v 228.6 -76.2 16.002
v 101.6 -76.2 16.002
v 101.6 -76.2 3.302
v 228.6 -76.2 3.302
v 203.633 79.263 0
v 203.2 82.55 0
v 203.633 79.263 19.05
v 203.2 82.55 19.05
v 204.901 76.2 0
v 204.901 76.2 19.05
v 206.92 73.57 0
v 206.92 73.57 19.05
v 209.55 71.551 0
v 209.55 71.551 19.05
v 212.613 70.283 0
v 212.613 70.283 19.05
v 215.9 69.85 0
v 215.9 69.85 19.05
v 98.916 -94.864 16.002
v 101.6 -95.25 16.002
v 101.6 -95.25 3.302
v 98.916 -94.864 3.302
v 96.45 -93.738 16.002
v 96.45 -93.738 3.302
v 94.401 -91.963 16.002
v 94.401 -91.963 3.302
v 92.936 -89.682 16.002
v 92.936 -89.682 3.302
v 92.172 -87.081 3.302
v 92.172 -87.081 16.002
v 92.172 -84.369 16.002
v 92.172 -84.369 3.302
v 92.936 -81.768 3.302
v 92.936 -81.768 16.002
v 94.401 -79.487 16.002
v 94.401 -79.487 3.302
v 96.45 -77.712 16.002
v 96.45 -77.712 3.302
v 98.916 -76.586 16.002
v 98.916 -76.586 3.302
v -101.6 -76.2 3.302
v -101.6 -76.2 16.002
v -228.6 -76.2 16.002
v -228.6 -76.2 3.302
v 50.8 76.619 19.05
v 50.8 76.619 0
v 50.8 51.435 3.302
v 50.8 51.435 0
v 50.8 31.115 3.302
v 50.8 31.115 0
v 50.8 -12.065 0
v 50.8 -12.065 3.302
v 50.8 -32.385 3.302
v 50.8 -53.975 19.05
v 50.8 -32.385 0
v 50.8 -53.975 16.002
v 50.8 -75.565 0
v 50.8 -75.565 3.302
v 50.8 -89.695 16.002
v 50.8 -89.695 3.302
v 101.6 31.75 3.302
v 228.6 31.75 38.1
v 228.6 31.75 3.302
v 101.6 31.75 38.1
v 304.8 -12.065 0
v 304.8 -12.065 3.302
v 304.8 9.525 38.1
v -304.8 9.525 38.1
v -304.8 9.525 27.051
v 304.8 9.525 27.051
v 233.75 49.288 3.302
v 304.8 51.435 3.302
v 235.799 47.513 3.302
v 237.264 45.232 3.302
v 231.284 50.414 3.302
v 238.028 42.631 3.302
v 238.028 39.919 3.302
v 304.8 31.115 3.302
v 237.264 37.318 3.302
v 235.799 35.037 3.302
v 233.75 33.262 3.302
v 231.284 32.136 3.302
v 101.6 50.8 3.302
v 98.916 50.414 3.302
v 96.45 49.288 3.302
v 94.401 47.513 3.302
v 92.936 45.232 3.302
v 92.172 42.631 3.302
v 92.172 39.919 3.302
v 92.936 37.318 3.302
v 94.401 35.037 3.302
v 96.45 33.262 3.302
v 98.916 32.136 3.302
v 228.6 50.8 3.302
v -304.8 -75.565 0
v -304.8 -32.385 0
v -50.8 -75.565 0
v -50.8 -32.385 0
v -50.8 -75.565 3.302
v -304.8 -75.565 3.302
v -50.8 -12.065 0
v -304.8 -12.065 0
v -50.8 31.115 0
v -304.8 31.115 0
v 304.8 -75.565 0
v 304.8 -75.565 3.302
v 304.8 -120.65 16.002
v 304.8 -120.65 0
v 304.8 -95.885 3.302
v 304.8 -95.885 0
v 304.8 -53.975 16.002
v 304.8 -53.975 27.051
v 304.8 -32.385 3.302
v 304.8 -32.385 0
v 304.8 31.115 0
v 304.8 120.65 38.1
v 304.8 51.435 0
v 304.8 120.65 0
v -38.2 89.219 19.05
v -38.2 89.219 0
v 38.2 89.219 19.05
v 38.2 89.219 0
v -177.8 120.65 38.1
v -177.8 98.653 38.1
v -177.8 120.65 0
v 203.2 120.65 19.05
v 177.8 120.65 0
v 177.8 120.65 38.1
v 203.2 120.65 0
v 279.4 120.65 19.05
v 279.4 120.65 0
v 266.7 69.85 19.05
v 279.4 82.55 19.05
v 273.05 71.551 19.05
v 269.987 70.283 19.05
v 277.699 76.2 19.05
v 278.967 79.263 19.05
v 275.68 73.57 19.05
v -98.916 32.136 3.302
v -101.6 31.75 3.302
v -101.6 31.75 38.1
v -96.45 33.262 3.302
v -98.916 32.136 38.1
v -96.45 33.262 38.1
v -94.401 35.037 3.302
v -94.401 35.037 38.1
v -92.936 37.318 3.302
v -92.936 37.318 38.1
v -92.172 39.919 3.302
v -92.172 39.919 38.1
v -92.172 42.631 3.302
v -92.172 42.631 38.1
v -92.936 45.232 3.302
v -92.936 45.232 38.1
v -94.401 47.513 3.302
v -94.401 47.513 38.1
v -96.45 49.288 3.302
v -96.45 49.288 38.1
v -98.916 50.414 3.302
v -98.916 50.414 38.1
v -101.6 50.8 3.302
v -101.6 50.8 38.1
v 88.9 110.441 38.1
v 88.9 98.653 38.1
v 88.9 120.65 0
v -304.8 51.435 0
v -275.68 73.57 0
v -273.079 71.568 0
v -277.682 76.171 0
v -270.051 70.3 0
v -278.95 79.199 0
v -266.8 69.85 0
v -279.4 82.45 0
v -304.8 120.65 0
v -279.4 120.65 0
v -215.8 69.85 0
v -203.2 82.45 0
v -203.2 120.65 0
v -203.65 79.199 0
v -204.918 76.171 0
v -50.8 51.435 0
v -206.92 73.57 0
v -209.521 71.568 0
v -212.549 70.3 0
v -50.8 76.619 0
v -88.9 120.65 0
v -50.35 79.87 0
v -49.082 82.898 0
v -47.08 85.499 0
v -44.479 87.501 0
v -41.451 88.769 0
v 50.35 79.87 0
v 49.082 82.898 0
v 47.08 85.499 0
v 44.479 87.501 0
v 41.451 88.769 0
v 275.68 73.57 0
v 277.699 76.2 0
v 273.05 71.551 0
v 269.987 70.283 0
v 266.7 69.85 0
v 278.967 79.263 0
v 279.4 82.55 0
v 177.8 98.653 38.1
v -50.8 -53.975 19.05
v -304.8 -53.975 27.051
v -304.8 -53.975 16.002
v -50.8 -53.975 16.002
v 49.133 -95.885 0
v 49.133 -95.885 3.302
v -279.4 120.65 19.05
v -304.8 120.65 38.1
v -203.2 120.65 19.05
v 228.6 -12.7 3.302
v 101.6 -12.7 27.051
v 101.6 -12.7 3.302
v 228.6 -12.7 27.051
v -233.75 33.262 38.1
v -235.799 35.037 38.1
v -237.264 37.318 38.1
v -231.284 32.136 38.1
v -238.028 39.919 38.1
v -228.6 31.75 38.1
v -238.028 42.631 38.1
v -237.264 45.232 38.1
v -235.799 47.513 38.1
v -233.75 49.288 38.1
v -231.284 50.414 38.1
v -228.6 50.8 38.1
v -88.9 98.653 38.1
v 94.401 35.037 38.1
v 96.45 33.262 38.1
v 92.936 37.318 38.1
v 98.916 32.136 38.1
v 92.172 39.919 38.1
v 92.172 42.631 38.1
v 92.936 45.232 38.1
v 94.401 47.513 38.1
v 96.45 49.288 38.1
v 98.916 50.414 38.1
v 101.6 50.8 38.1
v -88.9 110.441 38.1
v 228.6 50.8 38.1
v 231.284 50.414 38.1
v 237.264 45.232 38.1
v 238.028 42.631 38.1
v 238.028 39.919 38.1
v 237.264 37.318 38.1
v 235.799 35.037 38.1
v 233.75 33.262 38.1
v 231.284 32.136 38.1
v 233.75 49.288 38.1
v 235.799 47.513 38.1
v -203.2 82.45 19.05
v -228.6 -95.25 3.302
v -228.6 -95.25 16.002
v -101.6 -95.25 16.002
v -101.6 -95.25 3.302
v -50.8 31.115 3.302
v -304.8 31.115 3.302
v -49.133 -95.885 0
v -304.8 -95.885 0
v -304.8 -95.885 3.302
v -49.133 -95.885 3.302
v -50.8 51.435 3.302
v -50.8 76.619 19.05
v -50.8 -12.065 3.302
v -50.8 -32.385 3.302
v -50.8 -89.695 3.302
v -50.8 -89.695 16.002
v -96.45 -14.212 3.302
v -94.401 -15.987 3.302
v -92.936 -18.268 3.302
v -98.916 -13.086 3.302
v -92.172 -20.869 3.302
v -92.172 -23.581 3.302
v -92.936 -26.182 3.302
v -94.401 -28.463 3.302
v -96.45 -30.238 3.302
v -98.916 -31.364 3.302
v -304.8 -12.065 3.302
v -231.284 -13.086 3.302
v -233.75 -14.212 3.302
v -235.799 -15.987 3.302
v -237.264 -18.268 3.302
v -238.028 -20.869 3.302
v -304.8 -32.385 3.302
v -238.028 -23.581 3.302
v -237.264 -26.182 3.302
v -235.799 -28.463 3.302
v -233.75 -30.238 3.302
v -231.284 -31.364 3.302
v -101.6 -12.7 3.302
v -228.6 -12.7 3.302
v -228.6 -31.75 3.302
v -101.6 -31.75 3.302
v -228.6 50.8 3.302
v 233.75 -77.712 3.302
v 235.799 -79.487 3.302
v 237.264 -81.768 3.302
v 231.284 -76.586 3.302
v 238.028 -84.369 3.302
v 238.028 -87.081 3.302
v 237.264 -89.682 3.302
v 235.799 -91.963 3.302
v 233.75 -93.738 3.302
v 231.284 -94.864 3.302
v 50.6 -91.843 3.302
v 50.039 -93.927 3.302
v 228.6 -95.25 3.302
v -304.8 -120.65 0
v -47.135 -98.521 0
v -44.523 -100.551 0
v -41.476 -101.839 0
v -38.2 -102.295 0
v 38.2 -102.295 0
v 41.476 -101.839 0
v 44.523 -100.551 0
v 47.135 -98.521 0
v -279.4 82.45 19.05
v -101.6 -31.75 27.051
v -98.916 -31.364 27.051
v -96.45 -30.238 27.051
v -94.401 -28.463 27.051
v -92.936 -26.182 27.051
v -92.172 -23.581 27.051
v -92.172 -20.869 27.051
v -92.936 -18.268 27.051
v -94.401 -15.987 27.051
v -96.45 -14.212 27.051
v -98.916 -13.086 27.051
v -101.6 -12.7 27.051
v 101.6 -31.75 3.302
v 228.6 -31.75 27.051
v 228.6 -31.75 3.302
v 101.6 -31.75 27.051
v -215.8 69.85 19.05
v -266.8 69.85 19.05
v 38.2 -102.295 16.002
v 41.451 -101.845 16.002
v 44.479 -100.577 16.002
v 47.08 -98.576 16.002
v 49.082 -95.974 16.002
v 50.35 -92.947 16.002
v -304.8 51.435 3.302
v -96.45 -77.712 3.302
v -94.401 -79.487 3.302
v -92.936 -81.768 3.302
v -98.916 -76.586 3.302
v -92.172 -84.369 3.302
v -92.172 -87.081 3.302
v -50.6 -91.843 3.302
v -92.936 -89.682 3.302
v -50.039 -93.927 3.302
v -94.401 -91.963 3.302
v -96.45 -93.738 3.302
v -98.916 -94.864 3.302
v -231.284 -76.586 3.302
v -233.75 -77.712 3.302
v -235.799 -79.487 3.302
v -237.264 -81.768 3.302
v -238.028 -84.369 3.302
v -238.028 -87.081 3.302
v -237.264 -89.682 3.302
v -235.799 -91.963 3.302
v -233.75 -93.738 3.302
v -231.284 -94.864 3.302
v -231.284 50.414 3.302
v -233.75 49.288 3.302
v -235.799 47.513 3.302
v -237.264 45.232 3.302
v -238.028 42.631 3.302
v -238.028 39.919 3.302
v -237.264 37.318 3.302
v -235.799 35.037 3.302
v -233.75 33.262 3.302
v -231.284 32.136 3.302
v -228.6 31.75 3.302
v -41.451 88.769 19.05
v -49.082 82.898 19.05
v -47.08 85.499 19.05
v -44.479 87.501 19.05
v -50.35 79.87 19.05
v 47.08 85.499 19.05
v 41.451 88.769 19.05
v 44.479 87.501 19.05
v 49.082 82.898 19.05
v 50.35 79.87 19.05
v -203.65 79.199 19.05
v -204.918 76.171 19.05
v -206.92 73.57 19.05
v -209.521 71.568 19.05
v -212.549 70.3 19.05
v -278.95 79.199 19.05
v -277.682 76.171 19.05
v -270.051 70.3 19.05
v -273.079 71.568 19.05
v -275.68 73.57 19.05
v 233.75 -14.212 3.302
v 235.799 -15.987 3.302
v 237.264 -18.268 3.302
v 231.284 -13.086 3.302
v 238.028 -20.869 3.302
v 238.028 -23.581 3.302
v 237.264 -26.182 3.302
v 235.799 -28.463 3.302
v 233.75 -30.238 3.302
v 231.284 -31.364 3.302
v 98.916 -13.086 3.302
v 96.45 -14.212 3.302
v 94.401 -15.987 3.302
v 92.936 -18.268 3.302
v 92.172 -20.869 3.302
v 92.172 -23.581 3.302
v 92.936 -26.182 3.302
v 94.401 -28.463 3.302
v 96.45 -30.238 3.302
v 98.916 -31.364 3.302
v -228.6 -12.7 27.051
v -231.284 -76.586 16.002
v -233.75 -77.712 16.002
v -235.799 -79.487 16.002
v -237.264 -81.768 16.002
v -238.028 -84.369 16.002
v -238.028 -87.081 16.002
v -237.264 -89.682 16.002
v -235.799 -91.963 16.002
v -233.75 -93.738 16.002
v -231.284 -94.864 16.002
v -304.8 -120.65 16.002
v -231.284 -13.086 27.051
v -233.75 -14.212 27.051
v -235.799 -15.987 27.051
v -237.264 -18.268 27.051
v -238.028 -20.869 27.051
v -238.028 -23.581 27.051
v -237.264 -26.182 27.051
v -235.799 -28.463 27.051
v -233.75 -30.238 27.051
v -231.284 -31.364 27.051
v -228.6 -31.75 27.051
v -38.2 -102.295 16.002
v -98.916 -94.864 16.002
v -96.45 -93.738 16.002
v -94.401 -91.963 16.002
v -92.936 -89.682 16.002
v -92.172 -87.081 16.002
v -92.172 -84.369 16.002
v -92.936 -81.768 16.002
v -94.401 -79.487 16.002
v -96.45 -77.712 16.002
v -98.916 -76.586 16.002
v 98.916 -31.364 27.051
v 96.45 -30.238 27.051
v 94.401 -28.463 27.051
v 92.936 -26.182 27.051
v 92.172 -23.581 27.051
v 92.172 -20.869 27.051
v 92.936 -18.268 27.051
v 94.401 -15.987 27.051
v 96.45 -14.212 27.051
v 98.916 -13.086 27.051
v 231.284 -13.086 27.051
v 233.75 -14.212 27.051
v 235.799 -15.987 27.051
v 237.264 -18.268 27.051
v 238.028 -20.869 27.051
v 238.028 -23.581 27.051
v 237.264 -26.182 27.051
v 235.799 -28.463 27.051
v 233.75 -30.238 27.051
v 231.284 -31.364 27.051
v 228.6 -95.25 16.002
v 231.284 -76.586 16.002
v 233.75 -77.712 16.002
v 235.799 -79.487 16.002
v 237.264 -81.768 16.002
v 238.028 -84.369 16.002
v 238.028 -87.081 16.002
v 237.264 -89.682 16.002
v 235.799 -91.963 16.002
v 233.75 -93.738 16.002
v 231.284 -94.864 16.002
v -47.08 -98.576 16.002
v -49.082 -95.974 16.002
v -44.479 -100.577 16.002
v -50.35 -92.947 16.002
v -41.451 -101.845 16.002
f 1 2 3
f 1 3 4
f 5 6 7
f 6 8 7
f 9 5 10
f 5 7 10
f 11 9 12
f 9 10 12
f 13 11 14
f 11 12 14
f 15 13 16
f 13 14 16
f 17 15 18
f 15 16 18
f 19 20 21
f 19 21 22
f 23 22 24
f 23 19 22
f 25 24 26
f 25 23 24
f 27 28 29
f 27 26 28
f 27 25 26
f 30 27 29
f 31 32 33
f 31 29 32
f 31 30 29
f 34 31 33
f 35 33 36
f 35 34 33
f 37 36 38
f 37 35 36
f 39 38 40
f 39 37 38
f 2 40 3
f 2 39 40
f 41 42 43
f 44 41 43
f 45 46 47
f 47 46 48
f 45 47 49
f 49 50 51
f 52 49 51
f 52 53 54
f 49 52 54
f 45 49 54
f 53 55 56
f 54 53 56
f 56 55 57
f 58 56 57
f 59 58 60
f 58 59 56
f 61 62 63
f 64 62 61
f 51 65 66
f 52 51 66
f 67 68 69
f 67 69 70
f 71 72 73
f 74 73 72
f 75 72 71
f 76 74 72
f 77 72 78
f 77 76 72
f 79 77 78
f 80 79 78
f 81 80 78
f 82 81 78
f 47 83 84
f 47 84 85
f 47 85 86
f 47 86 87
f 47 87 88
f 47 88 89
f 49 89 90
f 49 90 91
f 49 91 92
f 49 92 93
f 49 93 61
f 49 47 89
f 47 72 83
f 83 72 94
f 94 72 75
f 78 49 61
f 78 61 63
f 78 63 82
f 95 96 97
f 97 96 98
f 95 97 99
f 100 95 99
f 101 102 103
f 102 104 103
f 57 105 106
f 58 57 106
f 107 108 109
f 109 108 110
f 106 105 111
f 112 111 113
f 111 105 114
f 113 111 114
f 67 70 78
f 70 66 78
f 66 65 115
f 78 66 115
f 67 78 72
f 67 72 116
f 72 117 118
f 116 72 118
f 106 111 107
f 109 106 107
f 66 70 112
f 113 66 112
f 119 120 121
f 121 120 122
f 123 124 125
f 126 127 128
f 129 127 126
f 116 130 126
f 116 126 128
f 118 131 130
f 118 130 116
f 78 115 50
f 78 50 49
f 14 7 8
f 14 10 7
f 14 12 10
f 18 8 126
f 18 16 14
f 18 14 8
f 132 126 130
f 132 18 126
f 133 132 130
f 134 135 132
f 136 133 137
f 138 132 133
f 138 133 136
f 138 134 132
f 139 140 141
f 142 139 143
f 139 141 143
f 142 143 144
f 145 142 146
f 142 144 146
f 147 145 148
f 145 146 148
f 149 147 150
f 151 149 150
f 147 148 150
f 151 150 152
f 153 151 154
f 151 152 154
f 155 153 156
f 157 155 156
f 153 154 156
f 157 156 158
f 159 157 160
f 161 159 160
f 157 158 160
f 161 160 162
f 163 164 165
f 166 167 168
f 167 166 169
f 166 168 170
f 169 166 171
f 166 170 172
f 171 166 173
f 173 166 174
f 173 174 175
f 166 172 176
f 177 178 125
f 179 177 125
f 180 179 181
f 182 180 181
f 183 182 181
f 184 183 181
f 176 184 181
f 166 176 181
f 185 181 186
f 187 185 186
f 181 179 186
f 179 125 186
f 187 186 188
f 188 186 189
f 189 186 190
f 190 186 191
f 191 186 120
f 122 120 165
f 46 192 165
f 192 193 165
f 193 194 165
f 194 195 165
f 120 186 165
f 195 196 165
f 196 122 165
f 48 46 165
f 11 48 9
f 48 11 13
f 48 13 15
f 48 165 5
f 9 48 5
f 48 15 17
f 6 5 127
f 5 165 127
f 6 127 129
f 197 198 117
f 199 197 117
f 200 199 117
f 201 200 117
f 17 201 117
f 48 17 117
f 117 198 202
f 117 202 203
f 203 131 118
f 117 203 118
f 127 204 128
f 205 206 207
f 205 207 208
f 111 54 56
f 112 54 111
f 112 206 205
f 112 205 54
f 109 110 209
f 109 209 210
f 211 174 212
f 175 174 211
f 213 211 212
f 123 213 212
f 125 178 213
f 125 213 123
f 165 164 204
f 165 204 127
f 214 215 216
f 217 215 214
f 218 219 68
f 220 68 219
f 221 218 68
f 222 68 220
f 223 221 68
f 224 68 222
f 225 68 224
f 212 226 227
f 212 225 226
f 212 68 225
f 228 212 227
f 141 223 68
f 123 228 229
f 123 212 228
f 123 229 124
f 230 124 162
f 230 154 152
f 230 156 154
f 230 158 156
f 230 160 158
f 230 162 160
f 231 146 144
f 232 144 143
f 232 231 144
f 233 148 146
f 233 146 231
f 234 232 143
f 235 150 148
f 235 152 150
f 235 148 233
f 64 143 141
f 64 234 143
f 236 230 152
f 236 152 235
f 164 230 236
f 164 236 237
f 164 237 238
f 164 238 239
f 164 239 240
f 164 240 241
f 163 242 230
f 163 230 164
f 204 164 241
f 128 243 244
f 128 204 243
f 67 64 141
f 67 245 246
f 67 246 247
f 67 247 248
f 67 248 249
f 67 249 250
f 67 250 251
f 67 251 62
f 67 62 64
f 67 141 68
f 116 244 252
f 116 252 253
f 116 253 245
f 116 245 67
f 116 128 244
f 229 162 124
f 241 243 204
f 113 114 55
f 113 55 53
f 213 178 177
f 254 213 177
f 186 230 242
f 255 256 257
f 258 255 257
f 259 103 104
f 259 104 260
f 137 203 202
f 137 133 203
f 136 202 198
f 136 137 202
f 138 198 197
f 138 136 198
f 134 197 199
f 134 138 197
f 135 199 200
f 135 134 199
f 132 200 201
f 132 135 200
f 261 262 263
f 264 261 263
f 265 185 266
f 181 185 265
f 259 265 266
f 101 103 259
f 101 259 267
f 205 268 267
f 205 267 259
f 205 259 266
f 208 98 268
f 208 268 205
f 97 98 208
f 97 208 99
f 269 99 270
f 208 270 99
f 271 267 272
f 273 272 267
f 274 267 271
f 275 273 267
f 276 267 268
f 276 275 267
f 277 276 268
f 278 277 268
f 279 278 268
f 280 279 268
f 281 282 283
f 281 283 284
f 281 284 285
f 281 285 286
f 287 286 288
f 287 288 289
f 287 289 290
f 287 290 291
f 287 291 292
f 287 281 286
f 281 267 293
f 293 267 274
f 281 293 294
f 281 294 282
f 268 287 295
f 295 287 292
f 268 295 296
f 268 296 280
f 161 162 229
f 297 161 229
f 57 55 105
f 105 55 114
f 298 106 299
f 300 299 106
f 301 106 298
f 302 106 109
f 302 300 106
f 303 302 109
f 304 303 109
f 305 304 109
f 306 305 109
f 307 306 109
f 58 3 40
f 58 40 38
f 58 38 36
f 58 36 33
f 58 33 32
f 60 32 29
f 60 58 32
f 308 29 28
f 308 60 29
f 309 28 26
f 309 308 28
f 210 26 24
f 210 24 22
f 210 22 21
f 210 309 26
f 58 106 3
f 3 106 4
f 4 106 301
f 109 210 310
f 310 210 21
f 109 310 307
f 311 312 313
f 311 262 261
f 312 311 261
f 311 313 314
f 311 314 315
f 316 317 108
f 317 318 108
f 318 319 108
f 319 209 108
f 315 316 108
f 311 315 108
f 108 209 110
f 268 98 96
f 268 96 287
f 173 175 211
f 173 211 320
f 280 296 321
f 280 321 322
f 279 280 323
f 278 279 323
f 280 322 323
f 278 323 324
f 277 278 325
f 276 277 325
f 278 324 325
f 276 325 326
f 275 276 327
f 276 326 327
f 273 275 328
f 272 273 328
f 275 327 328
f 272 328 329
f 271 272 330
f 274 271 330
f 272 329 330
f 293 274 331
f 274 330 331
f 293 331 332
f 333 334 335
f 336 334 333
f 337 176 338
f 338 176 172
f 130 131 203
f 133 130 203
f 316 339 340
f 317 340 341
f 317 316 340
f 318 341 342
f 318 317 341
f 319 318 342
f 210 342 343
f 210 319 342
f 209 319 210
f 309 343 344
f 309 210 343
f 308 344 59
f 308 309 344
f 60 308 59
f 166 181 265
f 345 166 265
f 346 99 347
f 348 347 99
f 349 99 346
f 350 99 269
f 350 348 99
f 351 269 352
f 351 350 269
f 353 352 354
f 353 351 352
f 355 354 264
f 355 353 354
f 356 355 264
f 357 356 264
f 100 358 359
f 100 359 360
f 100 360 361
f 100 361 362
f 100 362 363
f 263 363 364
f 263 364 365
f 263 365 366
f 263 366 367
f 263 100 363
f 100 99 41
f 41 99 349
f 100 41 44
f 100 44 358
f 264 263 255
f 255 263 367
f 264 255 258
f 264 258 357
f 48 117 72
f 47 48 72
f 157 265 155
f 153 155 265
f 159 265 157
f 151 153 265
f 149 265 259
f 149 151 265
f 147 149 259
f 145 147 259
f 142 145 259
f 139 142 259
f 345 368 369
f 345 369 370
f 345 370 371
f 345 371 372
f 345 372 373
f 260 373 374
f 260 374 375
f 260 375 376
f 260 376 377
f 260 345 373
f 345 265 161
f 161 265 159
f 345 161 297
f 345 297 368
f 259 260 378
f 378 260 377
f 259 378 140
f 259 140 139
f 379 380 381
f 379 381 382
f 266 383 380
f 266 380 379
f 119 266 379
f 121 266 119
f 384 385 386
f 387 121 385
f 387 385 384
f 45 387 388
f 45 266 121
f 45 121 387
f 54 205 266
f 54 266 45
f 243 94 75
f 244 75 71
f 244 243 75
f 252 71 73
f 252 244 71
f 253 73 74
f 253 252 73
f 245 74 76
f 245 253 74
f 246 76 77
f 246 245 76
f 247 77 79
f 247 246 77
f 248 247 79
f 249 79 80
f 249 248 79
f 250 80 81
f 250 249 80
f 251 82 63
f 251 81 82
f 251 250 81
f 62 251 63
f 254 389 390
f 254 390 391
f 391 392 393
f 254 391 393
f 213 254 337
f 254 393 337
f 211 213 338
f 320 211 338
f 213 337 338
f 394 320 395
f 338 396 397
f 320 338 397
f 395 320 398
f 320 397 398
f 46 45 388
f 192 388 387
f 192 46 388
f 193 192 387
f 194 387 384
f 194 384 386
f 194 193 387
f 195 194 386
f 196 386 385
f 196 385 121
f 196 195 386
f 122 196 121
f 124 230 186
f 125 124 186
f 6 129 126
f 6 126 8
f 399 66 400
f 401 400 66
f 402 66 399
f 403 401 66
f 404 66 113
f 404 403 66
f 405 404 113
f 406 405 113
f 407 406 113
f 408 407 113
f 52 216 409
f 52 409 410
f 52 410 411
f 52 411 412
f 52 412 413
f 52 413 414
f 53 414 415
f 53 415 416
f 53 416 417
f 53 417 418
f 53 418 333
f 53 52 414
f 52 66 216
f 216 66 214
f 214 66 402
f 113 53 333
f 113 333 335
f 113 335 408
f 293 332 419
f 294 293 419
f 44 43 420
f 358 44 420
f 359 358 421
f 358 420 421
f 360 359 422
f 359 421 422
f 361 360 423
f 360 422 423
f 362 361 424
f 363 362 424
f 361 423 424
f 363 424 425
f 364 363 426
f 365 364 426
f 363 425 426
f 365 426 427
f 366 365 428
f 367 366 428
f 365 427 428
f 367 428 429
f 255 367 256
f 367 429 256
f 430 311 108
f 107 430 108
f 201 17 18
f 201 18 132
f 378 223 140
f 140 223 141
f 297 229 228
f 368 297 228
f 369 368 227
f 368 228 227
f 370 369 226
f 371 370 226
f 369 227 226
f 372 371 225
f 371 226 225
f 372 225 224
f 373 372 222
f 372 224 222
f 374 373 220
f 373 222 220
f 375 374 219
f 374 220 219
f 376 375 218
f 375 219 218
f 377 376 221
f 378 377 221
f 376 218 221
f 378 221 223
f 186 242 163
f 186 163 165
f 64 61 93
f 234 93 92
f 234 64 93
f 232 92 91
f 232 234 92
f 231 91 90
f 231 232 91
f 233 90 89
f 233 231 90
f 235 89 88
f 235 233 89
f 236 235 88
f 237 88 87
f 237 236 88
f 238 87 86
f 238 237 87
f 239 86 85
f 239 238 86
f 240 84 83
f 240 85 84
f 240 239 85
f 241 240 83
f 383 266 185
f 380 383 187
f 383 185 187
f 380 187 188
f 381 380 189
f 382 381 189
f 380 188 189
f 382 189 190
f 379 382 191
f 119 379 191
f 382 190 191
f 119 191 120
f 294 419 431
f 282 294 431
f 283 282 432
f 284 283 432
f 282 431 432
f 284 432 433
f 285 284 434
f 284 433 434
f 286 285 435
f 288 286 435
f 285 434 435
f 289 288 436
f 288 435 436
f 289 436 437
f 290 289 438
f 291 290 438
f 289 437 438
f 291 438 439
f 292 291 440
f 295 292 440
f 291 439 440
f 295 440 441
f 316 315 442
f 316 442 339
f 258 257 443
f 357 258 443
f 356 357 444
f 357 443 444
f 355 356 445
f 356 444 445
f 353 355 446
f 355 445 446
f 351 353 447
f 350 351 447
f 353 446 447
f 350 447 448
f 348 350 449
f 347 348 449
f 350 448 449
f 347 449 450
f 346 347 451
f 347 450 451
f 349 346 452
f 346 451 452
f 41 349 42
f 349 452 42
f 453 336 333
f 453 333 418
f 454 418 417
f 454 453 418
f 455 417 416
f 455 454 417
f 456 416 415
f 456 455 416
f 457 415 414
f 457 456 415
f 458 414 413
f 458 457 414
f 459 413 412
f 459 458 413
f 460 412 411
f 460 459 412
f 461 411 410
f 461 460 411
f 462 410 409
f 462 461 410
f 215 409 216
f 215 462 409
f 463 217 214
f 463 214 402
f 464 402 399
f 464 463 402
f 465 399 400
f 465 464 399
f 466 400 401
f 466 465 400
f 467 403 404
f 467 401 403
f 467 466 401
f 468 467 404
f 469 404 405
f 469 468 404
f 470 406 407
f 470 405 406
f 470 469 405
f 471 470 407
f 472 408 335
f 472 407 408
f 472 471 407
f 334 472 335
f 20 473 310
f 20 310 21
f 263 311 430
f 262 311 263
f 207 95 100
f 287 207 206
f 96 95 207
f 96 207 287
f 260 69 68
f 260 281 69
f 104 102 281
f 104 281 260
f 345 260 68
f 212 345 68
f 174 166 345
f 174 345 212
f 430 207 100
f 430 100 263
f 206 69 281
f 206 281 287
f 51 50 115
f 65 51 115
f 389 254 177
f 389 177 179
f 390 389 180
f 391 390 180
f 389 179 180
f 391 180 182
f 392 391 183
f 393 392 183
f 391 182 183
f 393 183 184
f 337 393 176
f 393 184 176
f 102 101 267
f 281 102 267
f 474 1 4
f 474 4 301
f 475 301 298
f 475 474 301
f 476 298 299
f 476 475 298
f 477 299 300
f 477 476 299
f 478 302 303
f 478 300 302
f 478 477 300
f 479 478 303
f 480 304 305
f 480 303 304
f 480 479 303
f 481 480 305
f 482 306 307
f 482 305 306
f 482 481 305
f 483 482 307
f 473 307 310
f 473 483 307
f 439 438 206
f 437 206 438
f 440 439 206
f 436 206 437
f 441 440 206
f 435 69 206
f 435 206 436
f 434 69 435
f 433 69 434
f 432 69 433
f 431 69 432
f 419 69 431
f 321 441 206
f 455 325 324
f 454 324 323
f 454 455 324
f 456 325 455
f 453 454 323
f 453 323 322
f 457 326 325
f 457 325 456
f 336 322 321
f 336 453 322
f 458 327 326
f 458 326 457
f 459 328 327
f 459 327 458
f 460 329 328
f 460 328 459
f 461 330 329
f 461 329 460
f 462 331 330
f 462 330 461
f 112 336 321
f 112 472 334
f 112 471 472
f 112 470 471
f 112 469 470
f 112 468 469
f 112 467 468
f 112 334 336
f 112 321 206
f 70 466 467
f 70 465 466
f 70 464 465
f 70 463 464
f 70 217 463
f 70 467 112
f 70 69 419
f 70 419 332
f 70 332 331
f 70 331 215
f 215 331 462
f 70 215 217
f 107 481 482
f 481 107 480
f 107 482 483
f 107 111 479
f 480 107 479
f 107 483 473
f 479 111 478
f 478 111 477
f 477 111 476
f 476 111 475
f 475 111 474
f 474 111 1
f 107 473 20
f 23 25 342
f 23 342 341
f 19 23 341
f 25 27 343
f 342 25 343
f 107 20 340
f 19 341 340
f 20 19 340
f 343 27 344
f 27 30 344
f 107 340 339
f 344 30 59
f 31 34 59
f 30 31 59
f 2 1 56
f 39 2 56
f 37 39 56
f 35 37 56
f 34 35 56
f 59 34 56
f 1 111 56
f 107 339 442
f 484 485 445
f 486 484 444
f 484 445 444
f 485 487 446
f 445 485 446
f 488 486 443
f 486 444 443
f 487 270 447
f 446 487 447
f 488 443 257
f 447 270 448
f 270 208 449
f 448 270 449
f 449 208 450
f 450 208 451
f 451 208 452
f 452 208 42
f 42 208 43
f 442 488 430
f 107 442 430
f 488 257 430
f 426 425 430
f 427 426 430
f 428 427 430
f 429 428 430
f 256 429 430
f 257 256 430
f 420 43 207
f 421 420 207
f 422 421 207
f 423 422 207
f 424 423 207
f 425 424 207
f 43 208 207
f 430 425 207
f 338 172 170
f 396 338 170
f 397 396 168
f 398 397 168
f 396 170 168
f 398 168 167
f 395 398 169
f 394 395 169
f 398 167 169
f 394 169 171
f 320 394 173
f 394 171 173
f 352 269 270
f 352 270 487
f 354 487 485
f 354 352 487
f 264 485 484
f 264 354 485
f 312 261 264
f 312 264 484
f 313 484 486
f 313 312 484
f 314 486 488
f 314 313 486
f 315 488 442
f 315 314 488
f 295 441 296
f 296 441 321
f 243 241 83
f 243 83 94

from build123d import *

# Parameters (mm, degrees)
F0_W         = 609.6
F0_H         = 241.3
F1_DEPTH     = 38.1
F3_DEPTH     = 38.101
F4_W         = 76.2
F4_H         = 50.8
F5_DEPTH     = 19.05
F6_R         = 12.7
F8_DEPTH     = 88.9
F10_DEPTH    = 88.9
F11_W        = 609.6
F11_H        = 66.675
F12_DEPTH    = 22.098
F13_W        = 609.6
F13_H        = 63.5
F14_DEPTH    = 11.049
F15_W        = 101.6
F15_H        = 191.5146559477
F16_DEPTH    = 19.05
F17_T1_DEPTH = 19.05
F17_T3_DEPTH = 16.002
F18_W        = 20.32
F18_H        = 3.302
F19_DEPTH    = 609.601


# Not quite as in the source:
# - a fillet or chamfer that OpenCascade refuses, or shapes differently, is made with other operations: its cross-section is extruded or revolved along the edge and cut away or added
# - a pattern or mirror of a feature is missing from the dataset's text; its kind, count and spacing are read off the source's solid


with BuildPart() as f1:
    # F0 (on Top) → F1 (new body)
    with BuildSketch(Plane.XY):
        Rectangle(F0_W, F0_H)
    extrude(amount=F1_DEPTH)

    # F2 (on face) → F3 (cut, through all)
    with BuildSketch(Plane.XY.offset(38.1)):
        with BuildLine():
            Line((-101.6, -76.2), (-228.6, -76.2))
            ThreePointArc((-228.6, -76.2), (-238.125, -85.725), (-228.6, -95.25))
            Line((-228.6, -95.25), (-101.6, -95.25))
            ThreePointArc((-101.6, -95.25), (-92.075, -85.725), (-101.6, -76.2))
        make_face()
        with BuildLine():
            Line((-228.6, -31.75), (-101.6, -31.75))
            ThreePointArc((-101.6, -31.75), (-92.075, -22.225), (-101.6, -12.7))
            Line((-101.6, -12.7), (-228.6, -12.7))
            ThreePointArc((-228.6, -12.7), (-238.125, -22.225), (-228.6, -31.75))
        make_face()
        with BuildLine():
            Line((-228.6, 31.75), (-101.6, 31.75))
            ThreePointArc((-101.6, 31.75), (-92.075, 41.275), (-101.6, 50.8))
            Line((-101.6, 50.8), (-228.6, 50.8))
            ThreePointArc((-228.6, 50.8), (-238.125, 41.275), (-228.6, 31.75))
        make_face()
    f3 = extrude(amount=-F3_DEPTH, mode=Mode.SUBTRACT)

    # F3_copies: F3 across plane
    add(f3.mirror(Plane(origin=(0, 0, 0), x_dir=(0, 0, 1), z_dir=(1, 0, 0))), mode=Mode.SUBTRACT)

    # F4 (on face) → F5 (cut)
    with BuildSketch(Plane(origin=(0, 0, 0), x_dir=(1, 0, 0), z_dir=(0, 0, -1))):
        with Locations((241.3, -95.25)):
            Rectangle(F4_W, F4_H)
    f5 = extrude(amount=-F5_DEPTH, mode=Mode.SUBTRACT)

    # F5_copies: F5 across plane
    add(f5.mirror(Plane(origin=(0, 0, 0), x_dir=(0, 0, -1), z_dir=(-1, 0, 0))), mode=Mode.SUBTRACT)

    # F6
    f6_edges = [f1.edges().sort_by_distance(p)[0] for p in [
        (279.4, 69.85, 9.525),
        (203.2, 69.85, 9.525),
    ]]
    fillet(f6_edges, radius=F6_R)

    # F7 (on Right) → F8 (cut, symmetric)
    with BuildSketch(Plane.YZ):
        Polygon((120.65, 38.1), (110.4411357684, 38.1), (120.65, 0), align=None)
    extrude(amount=F8_DEPTH, both=True, mode=Mode.SUBTRACT)

    # F9 (on face) → F10 (cut)
    with BuildSketch(Plane.YZ.offset(-88.9)):
        Polygon((98.6529547439, 38.1), (120.65, 0), (120.65, 38.1), align=None)
    f10 = extrude(amount=-F10_DEPTH, mode=Mode.SUBTRACT)

    # F10_copies: F10 across plane
    add(f10.mirror(Plane(origin=(0, 0, 0), x_dir=(0, 0, 1), z_dir=(1, 0, 0))), mode=Mode.SUBTRACT)

    # F11 (on face) → F12 (cut)
    with BuildSketch(Plane.XY.offset(38.1)):
        with Locations((0, -87.3125)):
            Rectangle(F11_W, F11_H)
    extrude(amount=-F12_DEPTH, mode=Mode.SUBTRACT)

    # F13 (on face) → F14 (cut)
    with BuildSketch(Plane.XY.offset(38.1)):
        with Locations((0, -22.225)):
            Rectangle(F13_W, F13_H)
    extrude(amount=-F14_DEPTH, mode=Mode.SUBTRACT)

    # F15 (on face) → F16 (cut)
    with BuildSketch(Plane(origin=(0, 0, 0), x_dir=(1, 0, 0), z_dir=(0, 0, -1))):
        with Locations((0, 6.5381005406)):
            Rectangle(F15_W, F15_H)
    extrude(amount=-F16_DEPTH, mode=Mode.SUBTRACT)

    # F17: fillet of radius 12.7 on 6 edges, made by hand

    # F17_s2 → F17_t1 (join)
    with BuildSketch(Plane.XY):
        with BuildLine():
            ThreePointArc((-50.8004, 76.5182617478), (-47.0802561211, 85.4994835543), (-38.0990343146, 89.2196274332))
            Line((-38.0990343146, 89.2196274332), (-38.0990343146, 90.4897640017))
            ThreePointArc((-38.0990343146, 90.4897640017), (-44.4495171573, 90.4893640017), (-50.8, 90.4893640017))
            Line((-50.8, 90.4893640017), (-52.0701365685, 89.2192274332))
            ThreePointArc((-52.0701365685, 89.2192274332), (-52.0701365685, 82.8687445905), (-52.0705365685, 76.5182617478))
            Line((-52.0705365685, 76.5182617478), (-50.8004, 76.5182617478))
        make_face()
        with BuildLine():
            ThreePointArc((50.8004, 76.5182617478), (47.0802561211, 85.4994835543), (38.0990343146, 89.2196274332))
            Line((38.0990343146, 89.2196274332), (38.0990343146, 90.4897640017))
            ThreePointArc((38.0990343146, 90.4897640017), (44.4495171573, 90.4893640017), (50.8, 90.4893640017))
            Line((50.8, 90.4893640017), (52.0701365685, 89.2192274332))
            ThreePointArc((52.0701365685, 89.2192274332), (52.0701365685, 82.8687445905), (52.0705365685, 76.5182617478))
            Line((52.0705365685, 76.5182617478), (50.8004, 76.5182617478))
        make_face()
        with BuildLine():
            ThreePointArc((-203.1996, 82.5509656854), (-206.9197438789, 73.5697438789), (-215.9009656854, 69.8496))
            Line((-215.9009656854, 69.8496), (-215.9009656854, 68.5794634315))
            ThreePointArc((-215.9009656854, 68.5794634315), (-209.5504828427, 68.5798634315), (-203.2, 68.5798634315))
            Line((-203.2, 68.5798634315), (-201.9298634315, 69.85))
            ThreePointArc((-201.9298634315, 69.85), (-201.9298634315, 76.2004828427), (-201.9294634315, 82.5509656854))
            Line((-201.9294634315, 82.5509656854), (-203.1996, 82.5509656854))
        make_face()
        with BuildLine():
            ThreePointArc((-266.6990343146, 69.8496), (-275.6802561211, 73.5697438789), (-279.4004, 82.5509656854))
            Line((-279.4004, 82.5509656854), (-280.6705365685, 82.5509656854))
            ThreePointArc((-280.6705365685, 82.5509656854), (-280.6701365685, 76.2004828427), (-280.6701365685, 69.85))
            Line((-280.6701365685, 69.85), (-279.4, 68.5798634315))
            ThreePointArc((-279.4, 68.5798634315), (-273.0495171573, 68.5798634315), (-266.6990343146, 68.5794634315))
            Line((-266.6990343146, 68.5794634315), (-266.6990343146, 69.8496))
        make_face()
    extrude(amount=F17_T1_DEPTH)

    # F17_s4 → F17_t3 (join)
    with BuildSketch(Plane.XY):
        with BuildLine():
            ThreePointArc((-50.8004, -89.5944628291), (-47.0802561211, -98.5756846355), (-38.0990343146, -102.2958285145))
            Line((-38.0990343146, -102.2958285145), (-38.0990343146, -103.565965083))
            ThreePointArc((-38.0990343146, -103.565965083), (-44.4495171573, -103.565565083), (-50.8, -103.565565083))
            Line((-50.8, -103.565565083), (-52.0701365685, -102.2954285145))
            ThreePointArc((-52.0701365685, -102.2954285145), (-52.0701365685, -95.9449456718), (-52.0705365685, -89.5944628291))
            Line((-52.0705365685, -89.5944628291), (-50.8004, -89.5944628291))
        make_face()
        with BuildLine():
            ThreePointArc((38.0990343146, -102.2958285145), (47.0802561211, -98.5756846355), (50.8004, -89.5944628291))
            Line((50.8004, -89.5944628291), (52.0705365685, -89.5944628291))
            ThreePointArc((52.0705365685, -89.5944628291), (52.0701365685, -95.9449456718), (52.0701365685, -102.2954285145))
            Line((52.0701365685, -102.2954285145), (50.8, -103.565565083))
            ThreePointArc((50.8, -103.565565083), (44.4495171573, -103.565565083), (38.0990343146, -103.565965083))
            Line((38.0990343146, -103.565965083), (38.0990343146, -102.2958285145))
        make_face()
    extrude(amount=F17_T3_DEPTH)

    # F18 (on face) → F19 (cut, through all)
    with BuildSketch(Plane(origin=(-304.8, 0, 0), x_dir=(0, -1, 0), z_dir=(-1, 0, 0))):
        with Locations((-41.275, 1.651)):
            Rectangle(F18_W, F18_H)
        with Locations((22.225, 1.651)):
            Rectangle(F18_W, F18_H)
        with Locations((85.725, 1.651)):
            Rectangle(F18_W, F18_H)
    extrude(amount=-F19_DEPTH, mode=Mode.SUBTRACT)


solid = f1.part
